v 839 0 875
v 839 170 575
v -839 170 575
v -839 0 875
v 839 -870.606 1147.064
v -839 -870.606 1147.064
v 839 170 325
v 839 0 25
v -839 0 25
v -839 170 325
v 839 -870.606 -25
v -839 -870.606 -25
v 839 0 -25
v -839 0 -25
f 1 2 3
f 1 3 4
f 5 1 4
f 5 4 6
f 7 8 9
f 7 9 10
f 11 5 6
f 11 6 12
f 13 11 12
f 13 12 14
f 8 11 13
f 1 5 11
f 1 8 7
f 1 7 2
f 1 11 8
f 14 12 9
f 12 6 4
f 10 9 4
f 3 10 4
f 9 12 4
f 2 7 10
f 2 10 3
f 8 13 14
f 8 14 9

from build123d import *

# Parameters (mm, degrees)
F1_DEPTH = 1678
F3_DEPTH = 1678


with BuildPart() as f1:
    # F0 (on Right) → F1 (new body)
    with BuildSketch(Plane.YZ):
        Polygon((0, 25), (0, 0), (0, -25), (597.705221, -25), (820, 618.75), (0, 875), (170, 575), (170, 325), align=None)
    extrude(amount=F1_DEPTH)


with BuildPart() as f3:
    # F2 (on face) → F3 (new body)
    with BuildSketch(Plane.YZ.offset(839)):
        Polygon((170, 575), (0, 875), (-870.606259, 1147.064456), (-870.606259, -25), (0, -25), (0, 0), (0, 25), (170, 325), align=None)
    extrude(amount=-F3_DEPTH)


solid = f3.part
